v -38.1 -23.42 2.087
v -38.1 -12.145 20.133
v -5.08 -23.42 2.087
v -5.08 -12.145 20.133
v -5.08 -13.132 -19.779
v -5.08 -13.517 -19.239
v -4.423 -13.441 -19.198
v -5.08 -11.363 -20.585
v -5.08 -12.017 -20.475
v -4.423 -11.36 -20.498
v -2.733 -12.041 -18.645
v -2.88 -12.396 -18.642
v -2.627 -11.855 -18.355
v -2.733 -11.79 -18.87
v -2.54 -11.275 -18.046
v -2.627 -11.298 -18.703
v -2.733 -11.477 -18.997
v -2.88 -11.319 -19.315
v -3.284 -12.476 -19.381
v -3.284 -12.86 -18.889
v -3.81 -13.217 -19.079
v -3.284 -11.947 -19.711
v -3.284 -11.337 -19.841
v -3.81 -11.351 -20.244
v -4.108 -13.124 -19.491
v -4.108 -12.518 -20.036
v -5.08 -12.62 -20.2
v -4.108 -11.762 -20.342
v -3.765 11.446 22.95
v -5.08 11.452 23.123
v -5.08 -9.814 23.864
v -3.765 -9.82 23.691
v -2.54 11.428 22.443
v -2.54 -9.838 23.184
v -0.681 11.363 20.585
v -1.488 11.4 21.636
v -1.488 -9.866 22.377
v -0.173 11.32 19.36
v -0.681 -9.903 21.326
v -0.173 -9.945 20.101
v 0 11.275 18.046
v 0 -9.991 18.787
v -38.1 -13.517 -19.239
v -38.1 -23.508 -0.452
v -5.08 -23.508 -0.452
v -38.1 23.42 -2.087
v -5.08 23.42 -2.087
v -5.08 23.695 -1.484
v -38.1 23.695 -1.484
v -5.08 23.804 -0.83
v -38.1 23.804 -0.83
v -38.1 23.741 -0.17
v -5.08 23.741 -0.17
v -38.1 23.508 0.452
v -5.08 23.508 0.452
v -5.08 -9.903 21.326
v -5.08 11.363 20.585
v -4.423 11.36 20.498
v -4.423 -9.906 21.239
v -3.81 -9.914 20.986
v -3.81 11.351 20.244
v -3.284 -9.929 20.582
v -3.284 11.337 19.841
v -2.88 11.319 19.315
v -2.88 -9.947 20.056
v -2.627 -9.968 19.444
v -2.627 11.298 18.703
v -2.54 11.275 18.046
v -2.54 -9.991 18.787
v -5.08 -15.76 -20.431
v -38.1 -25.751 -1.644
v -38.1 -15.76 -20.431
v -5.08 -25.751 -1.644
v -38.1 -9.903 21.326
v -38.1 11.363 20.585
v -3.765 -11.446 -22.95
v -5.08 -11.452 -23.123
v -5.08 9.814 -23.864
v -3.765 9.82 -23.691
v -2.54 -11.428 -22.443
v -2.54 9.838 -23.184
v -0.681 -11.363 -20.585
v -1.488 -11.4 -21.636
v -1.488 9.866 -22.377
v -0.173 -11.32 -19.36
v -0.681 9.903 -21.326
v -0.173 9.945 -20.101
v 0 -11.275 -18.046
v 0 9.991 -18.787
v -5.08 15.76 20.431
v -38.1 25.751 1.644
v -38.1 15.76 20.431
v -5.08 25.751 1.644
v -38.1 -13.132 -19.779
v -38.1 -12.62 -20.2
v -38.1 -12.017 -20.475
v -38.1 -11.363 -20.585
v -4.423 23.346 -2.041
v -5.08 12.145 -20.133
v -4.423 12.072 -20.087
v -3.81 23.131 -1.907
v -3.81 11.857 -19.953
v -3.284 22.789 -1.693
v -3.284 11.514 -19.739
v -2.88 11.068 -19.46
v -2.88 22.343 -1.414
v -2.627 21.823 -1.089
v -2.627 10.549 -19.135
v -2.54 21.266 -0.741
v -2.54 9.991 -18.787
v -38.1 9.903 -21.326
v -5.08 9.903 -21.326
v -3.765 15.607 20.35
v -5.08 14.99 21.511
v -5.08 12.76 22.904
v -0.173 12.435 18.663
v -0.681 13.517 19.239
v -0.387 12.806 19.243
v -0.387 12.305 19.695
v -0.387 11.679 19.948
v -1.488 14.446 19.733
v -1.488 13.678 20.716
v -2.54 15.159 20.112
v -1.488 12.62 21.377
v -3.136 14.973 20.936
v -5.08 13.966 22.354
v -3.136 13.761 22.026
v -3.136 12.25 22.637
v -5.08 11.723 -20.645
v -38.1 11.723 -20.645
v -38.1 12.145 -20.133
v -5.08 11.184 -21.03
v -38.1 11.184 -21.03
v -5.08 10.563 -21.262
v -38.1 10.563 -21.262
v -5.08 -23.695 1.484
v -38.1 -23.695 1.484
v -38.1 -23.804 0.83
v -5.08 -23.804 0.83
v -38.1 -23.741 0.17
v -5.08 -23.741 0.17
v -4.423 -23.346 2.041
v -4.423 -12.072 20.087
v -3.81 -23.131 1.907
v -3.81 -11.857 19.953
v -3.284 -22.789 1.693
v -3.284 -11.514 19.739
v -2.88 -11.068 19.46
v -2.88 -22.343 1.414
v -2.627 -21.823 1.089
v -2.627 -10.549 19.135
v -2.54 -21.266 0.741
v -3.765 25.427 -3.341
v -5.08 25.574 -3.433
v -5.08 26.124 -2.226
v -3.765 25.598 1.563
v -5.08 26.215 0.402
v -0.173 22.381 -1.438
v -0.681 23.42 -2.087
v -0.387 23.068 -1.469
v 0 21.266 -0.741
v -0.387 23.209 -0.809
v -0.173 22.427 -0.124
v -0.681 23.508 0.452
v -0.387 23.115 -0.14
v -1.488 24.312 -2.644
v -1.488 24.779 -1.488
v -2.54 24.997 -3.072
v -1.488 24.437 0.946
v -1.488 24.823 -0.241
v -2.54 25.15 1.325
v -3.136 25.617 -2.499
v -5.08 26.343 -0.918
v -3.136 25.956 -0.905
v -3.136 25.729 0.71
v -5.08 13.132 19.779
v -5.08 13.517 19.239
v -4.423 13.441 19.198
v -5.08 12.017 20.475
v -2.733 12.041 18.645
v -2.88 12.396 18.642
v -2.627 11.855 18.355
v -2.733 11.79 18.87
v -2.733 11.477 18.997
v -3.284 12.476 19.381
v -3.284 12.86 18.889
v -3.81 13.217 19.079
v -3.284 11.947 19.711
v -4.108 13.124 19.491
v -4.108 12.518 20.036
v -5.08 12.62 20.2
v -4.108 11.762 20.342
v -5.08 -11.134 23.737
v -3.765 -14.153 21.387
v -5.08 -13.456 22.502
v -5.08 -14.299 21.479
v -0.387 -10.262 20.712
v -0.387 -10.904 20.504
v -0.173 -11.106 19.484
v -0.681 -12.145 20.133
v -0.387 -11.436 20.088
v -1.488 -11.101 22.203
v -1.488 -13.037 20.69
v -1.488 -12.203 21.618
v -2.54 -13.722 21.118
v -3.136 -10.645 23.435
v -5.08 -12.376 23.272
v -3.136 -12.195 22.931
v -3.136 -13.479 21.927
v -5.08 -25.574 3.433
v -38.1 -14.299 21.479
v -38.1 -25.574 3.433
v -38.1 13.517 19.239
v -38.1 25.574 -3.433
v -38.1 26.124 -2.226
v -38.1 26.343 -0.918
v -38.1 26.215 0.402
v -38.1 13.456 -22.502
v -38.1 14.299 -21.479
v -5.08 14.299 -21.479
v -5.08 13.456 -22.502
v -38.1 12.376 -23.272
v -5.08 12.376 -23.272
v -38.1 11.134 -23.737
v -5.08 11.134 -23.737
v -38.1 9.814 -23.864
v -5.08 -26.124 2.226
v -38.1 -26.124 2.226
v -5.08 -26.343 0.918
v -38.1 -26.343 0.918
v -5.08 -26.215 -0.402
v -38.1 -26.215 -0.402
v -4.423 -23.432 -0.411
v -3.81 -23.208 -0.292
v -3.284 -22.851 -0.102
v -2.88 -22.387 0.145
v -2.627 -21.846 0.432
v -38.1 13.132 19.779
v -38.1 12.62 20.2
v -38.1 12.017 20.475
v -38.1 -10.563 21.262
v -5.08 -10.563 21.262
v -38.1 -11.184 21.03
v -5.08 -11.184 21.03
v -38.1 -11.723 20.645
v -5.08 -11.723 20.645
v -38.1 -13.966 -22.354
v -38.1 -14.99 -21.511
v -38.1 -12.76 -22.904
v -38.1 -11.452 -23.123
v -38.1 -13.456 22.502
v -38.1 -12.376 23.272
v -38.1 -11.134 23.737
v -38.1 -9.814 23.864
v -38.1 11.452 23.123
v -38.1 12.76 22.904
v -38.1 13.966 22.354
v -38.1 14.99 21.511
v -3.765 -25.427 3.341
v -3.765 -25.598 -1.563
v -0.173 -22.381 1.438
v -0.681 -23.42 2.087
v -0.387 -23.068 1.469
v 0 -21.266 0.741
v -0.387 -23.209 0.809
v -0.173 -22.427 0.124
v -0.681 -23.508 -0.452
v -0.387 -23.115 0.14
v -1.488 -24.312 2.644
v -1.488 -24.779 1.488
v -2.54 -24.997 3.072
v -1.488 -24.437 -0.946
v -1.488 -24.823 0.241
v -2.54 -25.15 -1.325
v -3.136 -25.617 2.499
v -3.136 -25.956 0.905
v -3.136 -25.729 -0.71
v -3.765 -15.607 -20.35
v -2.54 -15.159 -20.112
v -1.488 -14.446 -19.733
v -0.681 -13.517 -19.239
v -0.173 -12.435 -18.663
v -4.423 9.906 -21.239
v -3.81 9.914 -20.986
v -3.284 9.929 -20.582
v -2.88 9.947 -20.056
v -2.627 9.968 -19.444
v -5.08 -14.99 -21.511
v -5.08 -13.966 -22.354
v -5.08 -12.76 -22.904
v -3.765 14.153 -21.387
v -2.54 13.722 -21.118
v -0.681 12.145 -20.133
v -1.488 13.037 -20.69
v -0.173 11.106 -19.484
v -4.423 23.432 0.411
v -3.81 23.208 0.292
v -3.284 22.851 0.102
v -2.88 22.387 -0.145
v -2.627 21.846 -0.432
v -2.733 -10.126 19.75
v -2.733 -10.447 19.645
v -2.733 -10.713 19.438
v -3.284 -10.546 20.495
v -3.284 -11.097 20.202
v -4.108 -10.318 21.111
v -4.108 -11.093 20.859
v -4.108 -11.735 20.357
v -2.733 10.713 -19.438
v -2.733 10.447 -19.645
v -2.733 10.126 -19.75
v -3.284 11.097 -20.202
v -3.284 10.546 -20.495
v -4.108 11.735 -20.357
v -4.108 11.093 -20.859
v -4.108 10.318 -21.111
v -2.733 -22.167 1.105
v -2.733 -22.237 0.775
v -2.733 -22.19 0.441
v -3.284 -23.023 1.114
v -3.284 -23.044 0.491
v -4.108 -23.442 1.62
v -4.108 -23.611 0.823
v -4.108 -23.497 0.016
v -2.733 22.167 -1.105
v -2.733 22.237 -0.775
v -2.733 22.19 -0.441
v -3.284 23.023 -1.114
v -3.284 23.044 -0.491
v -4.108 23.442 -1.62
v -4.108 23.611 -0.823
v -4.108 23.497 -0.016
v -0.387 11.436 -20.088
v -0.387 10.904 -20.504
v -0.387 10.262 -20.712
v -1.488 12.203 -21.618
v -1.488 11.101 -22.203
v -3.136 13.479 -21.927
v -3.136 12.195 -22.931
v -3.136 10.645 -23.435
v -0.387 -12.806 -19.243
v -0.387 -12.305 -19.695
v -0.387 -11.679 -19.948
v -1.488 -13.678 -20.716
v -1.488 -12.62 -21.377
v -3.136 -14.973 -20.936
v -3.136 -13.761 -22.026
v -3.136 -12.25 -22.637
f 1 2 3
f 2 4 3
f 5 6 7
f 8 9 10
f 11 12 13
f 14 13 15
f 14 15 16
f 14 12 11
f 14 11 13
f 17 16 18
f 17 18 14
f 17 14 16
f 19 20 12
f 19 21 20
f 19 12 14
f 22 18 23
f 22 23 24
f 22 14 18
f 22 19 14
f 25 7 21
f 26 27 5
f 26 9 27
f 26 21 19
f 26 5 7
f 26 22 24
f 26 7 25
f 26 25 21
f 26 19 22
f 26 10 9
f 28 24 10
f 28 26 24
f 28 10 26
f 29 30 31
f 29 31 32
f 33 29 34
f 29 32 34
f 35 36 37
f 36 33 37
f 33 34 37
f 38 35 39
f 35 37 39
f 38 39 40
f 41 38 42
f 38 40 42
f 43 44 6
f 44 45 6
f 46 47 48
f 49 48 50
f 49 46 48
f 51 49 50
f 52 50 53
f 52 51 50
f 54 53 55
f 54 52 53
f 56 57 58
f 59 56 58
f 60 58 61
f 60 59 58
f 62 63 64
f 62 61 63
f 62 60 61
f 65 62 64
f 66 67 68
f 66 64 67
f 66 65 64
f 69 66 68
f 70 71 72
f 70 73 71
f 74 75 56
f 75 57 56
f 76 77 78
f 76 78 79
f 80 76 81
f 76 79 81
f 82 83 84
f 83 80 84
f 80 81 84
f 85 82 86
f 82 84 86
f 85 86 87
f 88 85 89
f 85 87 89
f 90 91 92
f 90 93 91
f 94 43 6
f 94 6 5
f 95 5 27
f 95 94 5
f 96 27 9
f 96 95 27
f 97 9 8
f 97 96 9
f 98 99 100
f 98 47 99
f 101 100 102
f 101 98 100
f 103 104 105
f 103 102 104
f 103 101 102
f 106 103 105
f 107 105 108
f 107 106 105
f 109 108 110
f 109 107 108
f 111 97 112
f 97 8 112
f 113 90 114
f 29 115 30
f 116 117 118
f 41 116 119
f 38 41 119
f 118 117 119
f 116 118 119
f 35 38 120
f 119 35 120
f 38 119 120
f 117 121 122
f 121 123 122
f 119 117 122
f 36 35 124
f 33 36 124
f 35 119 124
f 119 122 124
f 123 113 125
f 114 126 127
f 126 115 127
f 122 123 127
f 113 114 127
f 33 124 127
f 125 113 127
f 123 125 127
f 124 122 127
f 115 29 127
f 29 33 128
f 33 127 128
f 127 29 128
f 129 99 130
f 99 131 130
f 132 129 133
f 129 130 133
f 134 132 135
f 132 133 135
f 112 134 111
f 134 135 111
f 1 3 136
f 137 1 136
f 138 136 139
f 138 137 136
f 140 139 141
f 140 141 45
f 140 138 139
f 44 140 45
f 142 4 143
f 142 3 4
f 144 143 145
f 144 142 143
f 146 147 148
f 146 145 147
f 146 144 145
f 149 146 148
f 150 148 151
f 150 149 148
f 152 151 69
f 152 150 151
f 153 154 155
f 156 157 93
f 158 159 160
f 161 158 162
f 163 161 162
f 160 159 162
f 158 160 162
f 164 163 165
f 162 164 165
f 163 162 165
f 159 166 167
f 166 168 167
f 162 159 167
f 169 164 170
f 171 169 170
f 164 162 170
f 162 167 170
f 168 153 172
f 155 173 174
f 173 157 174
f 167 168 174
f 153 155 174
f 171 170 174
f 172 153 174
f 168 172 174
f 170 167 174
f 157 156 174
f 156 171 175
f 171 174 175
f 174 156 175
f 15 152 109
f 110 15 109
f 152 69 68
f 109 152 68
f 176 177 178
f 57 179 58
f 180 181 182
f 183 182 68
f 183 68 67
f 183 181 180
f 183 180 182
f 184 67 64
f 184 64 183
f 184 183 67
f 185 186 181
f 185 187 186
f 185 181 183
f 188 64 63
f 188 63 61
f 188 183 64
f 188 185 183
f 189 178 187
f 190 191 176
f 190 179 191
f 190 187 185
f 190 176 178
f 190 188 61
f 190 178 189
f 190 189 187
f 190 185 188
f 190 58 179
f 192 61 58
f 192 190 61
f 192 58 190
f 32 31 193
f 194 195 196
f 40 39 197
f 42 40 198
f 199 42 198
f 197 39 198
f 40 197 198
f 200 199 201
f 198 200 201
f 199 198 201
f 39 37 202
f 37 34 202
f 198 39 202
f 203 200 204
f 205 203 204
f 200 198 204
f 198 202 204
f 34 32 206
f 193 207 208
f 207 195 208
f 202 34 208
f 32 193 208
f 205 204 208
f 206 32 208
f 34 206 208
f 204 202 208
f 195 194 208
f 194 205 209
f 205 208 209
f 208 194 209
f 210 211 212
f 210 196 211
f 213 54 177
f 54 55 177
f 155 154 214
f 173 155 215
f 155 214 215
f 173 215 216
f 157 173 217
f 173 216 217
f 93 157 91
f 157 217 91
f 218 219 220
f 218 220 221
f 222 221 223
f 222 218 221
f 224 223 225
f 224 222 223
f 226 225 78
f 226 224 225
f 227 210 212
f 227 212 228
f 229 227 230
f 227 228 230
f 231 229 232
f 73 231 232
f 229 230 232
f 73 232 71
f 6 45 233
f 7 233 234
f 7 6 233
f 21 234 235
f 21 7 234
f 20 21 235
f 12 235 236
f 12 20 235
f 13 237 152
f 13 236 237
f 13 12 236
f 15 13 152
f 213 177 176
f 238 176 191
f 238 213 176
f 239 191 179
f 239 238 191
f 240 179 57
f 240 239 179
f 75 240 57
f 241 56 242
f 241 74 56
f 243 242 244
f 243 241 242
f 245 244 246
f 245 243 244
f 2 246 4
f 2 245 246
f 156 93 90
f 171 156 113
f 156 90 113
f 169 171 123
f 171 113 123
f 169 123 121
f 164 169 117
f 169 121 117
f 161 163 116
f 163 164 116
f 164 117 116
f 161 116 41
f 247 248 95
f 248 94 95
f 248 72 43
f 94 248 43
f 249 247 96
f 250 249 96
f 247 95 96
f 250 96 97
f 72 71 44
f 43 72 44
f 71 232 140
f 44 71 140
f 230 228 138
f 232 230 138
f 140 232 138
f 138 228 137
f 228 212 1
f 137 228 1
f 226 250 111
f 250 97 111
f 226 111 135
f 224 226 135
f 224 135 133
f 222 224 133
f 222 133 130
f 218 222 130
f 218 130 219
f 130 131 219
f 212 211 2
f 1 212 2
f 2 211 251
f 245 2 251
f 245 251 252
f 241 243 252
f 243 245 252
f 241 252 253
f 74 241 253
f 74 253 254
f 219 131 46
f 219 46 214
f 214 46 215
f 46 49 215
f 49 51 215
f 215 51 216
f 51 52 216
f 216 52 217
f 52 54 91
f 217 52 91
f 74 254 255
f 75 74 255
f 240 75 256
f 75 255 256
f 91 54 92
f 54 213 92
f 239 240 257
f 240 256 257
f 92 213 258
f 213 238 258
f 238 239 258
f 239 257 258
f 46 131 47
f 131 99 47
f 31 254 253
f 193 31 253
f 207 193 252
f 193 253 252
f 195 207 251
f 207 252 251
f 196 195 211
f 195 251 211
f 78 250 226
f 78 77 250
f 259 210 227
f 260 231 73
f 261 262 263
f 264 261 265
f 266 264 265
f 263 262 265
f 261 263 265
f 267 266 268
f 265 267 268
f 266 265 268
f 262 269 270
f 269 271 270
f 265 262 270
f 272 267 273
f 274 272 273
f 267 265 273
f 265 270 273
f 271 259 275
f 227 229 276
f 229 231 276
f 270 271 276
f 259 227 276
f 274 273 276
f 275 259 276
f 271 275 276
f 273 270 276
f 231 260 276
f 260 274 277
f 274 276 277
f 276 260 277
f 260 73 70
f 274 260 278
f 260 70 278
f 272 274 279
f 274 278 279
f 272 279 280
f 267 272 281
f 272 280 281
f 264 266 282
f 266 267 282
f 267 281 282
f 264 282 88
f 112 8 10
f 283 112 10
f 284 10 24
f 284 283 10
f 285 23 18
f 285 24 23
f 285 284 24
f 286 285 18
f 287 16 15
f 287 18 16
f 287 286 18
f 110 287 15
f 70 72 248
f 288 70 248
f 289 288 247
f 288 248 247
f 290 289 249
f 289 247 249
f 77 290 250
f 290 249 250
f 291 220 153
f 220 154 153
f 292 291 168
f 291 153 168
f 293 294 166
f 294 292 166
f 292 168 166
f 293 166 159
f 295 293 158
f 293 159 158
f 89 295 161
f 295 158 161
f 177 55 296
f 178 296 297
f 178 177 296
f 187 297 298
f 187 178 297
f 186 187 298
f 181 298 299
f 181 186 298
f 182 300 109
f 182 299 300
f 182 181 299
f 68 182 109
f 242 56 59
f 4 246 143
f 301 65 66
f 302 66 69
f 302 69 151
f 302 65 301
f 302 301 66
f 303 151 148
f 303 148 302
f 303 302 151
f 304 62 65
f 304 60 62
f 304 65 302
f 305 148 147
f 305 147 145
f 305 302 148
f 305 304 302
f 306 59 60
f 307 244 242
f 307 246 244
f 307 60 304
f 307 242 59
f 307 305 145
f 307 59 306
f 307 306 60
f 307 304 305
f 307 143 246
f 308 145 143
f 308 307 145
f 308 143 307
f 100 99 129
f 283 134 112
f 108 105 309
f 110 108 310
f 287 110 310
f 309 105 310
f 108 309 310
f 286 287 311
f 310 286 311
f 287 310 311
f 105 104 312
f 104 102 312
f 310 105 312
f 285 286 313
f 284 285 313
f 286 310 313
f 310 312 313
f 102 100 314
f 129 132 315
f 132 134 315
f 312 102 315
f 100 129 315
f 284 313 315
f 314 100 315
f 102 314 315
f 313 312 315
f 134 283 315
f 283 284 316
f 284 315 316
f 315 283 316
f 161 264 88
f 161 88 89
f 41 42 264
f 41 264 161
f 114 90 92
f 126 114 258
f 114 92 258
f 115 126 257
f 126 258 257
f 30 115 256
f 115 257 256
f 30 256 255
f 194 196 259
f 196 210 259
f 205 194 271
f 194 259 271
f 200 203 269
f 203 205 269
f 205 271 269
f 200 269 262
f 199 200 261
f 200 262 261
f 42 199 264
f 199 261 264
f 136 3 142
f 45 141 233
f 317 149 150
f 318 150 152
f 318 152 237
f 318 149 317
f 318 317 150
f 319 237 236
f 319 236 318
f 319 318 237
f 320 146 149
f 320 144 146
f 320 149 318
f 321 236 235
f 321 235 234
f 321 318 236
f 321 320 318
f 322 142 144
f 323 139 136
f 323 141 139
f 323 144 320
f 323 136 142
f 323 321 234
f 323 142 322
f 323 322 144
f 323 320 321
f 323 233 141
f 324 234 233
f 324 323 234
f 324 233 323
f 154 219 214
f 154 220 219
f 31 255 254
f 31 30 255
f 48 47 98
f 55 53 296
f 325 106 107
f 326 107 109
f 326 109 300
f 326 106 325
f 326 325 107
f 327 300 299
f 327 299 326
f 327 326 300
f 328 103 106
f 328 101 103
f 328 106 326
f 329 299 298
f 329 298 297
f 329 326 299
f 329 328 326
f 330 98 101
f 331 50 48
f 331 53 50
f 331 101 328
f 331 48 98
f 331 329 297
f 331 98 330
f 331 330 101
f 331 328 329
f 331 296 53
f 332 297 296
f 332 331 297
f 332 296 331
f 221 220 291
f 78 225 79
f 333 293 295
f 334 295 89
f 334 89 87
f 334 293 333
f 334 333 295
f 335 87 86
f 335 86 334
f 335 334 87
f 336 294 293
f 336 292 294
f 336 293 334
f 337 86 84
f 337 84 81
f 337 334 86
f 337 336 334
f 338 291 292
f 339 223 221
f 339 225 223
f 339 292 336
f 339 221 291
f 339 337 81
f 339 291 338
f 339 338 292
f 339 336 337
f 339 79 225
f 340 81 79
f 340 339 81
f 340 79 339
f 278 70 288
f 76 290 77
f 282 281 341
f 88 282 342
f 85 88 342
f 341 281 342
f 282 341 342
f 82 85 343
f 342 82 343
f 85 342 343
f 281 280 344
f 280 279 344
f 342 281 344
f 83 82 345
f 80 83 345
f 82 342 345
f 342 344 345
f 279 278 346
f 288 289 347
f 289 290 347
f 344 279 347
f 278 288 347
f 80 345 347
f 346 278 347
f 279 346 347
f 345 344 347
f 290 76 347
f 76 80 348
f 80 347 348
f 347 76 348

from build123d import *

# Parameters (mm, degrees)
F1_DEPTH = 38.1
F2_R     = 5.08
F3_T     = -2.54


with BuildPart() as f1:
    # F0 (on Right) → F1 (new body)
    with BuildSketch(Plane.YZ):
        Polygon((12.745309, -23.966217), (27.128007, -0.945347), (14.382698, 23.02087), (-12.745309, 23.966217), (-27.128007, 0.945347), (-14.382698, -23.02087), align=None)
    extrude(amount=-F1_DEPTH)

    # F2
    f2_edges = [f1.edges().sort_by_distance(p)[0] for p in [
        (-19.05, -12.745309, 23.966217),
        (-19.05, -27.128007, 0.945347),
        (-19.05, 14.382698, 23.02087),
        (-19.05, 12.745309, -23.966217),
        (-19.05, 27.128007, -0.945347),
        (-19.05, -14.382698, -23.02087),
        (0, 19.936658, -12.455782),
        (0, 20.755353, 11.037761),
        (0, 0.818695, 23.493543),
        (0, -19.936658, 12.455782),
        (0, -20.755353, -11.037761),
        (0, -0.818695, -23.493543),
    ]]
    fillet(f2_edges, radius=F2_R)

    # F3
    f3_openings = [f1.faces().sort_by_distance(p)[0] for p in [
        (-38.1, 0, 0),
    ]]
    offset(amount=F3_T, openings=f3_openings)


solid = f1.part
